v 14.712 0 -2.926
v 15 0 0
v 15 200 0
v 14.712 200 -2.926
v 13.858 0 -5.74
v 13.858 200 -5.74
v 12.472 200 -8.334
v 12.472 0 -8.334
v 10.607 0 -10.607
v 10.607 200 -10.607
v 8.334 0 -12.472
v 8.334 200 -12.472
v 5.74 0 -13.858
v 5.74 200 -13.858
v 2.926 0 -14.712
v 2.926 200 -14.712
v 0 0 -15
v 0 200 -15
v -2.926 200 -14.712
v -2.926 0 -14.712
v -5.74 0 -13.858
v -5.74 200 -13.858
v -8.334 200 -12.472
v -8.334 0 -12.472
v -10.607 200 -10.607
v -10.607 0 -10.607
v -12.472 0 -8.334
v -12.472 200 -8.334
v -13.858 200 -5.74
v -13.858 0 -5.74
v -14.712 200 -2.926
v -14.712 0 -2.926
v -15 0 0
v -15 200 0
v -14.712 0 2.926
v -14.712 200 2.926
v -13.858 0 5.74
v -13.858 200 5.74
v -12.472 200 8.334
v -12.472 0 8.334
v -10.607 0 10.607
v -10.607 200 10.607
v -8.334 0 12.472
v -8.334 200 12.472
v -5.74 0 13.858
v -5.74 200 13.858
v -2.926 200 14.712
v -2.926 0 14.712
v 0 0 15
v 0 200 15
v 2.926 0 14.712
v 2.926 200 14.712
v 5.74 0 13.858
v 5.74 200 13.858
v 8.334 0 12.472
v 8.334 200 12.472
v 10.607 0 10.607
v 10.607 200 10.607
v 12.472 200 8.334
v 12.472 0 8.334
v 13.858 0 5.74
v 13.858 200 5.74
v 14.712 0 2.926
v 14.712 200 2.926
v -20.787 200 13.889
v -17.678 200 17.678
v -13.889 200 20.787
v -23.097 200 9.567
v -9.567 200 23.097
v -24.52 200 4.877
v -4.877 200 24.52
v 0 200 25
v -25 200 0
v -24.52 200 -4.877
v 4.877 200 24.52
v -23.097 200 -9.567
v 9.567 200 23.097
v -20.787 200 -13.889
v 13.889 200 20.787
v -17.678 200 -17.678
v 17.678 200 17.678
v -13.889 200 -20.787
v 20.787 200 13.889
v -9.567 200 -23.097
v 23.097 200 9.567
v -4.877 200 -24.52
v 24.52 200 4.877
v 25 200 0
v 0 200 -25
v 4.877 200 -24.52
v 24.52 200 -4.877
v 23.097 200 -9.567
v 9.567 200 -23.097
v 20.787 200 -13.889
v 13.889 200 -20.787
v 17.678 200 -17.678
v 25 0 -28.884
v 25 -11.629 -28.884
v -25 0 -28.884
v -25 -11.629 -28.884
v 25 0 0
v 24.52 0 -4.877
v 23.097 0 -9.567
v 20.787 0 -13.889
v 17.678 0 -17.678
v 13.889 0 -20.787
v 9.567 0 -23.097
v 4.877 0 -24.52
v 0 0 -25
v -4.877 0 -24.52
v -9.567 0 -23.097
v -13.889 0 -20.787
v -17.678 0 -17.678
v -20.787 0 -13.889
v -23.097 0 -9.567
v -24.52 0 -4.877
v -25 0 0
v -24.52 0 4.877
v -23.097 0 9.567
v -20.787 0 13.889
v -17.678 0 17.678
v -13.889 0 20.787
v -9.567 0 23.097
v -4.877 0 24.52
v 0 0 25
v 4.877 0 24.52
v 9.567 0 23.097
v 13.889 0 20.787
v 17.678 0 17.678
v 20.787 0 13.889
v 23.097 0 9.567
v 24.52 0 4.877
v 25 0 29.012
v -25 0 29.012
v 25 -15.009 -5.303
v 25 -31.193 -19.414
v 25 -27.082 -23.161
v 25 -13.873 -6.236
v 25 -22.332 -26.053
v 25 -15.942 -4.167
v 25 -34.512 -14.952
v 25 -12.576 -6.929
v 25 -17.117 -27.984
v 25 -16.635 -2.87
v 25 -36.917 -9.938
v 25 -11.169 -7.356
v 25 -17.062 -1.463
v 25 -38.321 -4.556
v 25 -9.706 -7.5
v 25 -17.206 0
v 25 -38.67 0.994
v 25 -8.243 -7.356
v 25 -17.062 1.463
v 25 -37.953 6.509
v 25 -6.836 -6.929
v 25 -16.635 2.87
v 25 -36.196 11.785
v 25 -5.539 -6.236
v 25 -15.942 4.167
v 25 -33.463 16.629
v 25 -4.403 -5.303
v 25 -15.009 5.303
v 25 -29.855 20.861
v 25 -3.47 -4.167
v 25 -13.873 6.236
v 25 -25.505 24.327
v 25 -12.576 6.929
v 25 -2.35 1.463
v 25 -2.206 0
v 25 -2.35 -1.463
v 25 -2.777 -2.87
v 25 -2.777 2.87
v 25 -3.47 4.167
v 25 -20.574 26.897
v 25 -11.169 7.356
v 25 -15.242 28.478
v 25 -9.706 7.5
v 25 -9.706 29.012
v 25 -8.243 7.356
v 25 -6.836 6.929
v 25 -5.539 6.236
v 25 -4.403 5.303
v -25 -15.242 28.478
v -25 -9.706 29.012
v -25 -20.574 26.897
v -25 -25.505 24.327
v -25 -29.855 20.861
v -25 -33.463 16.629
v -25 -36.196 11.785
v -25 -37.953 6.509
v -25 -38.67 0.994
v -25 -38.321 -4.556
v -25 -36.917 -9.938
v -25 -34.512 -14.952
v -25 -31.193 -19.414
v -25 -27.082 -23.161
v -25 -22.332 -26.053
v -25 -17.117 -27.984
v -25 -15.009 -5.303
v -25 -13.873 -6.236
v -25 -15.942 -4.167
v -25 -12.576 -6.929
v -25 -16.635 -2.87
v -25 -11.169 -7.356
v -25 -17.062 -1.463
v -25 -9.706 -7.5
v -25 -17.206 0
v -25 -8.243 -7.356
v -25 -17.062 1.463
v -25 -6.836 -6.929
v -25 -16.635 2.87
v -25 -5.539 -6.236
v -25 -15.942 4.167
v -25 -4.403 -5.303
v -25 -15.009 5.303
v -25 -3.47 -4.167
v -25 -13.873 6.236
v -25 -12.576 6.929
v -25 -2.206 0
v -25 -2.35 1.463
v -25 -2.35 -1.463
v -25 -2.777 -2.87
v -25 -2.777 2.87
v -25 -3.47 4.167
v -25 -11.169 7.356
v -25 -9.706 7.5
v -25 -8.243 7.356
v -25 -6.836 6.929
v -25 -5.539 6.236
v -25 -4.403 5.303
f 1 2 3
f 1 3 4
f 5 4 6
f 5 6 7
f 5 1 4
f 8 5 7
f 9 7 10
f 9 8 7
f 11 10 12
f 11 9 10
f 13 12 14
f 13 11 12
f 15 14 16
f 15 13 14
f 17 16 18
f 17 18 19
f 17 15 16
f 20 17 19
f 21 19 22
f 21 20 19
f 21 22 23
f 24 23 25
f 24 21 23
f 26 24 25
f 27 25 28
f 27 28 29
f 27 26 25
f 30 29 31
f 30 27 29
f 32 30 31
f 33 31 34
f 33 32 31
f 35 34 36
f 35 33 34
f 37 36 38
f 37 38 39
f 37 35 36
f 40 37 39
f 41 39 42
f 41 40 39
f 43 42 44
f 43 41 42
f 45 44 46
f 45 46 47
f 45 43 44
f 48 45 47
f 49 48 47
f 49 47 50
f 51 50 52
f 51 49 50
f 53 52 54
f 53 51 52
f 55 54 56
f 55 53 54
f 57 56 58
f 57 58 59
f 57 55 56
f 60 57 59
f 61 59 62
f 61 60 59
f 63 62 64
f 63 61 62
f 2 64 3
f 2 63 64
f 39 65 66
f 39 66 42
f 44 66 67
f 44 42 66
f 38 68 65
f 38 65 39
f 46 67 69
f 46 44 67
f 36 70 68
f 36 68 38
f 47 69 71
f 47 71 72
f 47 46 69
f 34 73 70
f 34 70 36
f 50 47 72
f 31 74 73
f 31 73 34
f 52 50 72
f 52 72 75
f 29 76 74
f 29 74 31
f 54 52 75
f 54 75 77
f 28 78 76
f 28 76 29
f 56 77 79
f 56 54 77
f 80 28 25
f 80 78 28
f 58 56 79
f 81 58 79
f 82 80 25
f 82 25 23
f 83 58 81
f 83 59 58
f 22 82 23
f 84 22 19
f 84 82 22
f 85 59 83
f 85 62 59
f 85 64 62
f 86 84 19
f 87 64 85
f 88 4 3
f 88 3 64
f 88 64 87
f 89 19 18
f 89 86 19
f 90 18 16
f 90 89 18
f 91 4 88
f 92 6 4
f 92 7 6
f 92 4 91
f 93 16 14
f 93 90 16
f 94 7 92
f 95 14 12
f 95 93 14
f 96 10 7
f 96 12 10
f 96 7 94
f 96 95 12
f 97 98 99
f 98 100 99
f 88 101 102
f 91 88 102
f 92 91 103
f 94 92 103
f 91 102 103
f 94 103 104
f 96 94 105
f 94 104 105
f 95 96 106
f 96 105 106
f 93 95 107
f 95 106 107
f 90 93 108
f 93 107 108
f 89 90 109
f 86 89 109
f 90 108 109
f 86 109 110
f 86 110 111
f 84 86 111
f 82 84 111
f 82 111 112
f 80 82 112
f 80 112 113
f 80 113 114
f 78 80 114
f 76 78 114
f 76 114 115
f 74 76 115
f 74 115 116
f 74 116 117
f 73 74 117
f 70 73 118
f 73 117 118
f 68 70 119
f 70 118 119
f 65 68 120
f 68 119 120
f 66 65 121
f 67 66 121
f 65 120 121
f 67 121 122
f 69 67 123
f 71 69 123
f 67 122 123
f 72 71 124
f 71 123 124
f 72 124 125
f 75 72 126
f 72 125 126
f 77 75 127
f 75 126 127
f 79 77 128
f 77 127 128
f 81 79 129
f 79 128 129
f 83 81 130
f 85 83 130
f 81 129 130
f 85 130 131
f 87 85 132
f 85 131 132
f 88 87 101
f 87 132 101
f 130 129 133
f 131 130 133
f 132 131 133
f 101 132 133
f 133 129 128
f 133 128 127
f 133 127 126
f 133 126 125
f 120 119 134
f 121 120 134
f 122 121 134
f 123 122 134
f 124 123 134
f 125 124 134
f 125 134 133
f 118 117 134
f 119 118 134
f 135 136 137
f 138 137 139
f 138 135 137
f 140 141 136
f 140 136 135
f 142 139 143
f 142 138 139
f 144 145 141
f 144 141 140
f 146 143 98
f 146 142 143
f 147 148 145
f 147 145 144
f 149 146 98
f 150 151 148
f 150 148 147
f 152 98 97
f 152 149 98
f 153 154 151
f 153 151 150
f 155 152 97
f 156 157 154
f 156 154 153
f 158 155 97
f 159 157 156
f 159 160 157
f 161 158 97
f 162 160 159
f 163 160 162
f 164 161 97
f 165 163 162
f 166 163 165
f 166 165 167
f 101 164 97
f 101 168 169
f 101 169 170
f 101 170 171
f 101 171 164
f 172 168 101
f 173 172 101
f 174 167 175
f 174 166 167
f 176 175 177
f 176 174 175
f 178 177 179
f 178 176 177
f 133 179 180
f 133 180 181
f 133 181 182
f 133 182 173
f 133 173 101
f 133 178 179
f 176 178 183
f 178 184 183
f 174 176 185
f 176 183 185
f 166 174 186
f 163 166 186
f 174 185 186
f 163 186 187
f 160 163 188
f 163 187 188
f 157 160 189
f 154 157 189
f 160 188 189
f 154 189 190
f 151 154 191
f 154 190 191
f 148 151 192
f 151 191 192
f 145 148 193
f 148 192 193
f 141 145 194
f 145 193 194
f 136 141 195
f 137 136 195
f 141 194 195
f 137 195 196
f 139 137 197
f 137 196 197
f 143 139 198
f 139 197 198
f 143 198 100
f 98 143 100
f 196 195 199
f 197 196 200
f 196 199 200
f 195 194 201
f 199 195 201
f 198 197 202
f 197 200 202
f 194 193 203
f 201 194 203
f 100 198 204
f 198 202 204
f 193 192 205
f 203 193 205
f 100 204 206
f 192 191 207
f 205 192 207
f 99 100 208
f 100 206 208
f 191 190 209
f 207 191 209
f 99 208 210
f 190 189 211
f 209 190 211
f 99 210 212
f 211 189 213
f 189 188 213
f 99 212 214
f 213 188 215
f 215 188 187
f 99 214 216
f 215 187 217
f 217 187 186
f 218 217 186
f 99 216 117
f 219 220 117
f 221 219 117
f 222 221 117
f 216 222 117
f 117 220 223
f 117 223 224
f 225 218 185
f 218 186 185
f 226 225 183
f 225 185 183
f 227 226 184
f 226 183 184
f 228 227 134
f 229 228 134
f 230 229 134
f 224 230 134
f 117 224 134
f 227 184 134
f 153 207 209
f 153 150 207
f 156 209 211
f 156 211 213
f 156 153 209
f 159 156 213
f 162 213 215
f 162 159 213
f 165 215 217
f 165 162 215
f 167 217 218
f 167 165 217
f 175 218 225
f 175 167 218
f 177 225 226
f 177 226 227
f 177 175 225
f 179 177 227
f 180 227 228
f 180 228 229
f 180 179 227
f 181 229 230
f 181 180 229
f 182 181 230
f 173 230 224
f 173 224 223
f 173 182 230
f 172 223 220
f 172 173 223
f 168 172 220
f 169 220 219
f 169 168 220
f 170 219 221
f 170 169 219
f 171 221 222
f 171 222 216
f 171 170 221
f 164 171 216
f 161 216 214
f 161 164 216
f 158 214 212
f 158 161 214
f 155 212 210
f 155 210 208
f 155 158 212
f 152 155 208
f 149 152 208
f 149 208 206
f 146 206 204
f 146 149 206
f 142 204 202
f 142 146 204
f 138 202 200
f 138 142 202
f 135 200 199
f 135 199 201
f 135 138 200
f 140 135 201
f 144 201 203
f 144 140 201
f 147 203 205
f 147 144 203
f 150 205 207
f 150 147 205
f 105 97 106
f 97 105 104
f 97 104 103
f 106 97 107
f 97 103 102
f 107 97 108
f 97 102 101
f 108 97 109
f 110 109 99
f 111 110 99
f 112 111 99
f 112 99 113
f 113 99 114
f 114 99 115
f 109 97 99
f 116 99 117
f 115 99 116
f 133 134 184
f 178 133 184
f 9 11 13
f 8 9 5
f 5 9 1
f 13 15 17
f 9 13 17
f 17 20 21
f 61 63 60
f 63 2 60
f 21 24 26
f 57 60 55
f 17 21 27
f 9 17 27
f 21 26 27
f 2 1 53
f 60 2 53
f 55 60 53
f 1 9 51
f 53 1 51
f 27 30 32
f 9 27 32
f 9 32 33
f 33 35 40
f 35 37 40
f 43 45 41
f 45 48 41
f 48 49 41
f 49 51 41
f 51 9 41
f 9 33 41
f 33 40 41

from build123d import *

# Parameters (mm, degrees)
SKETCH2_R           = 25
SKETCH2_R_2         = 15
BOSS_EXTRUDE1_DEPTH = 200
SKETCH5_R           = 7.5
BOSS_EXTRUDE2_DEPTH = 25


with BuildPart() as part:
    # Sketch2 → Boss-Extrude1 (new body)
    with BuildSketch(Plane(origin=(0, 0, 0), x_dir=(1, 0, 0), z_dir=(0, 1, 0))):
        Circle(SKETCH2_R)
        Circle(SKETCH2_R_2, mode=Mode.SUBTRACT)
    extrude(amount=BOSS_EXTRUDE1_DEPTH)

    # Sketch5 → Boss-Extrude2 (add, symmetric)
    with BuildSketch(Plane(origin=(0, 0, 0), x_dir=(0, -1, 0), z_dir=(-1, 0, 0))):
        with BuildLine():
            Line((0, 29.012112286), (9.706174679, 29.012112286))
            ThreePointArc((9.706174679, 29.012112286), (38.670140077, 0.993968953), (11.62868774, -28.883907525))
            Line((11.62868774, -28.883907525), (0, -28.883907525))
            Line((0, -28.883907525), (0, 29.012112286))
        make_face()
        with Locations((9.706174679, 0)):
            Circle(SKETCH5_R, mode=Mode.SUBTRACT)
    extrude(amount=BOSS_EXTRUDE2_DEPTH, both=True)


solid = part.part
